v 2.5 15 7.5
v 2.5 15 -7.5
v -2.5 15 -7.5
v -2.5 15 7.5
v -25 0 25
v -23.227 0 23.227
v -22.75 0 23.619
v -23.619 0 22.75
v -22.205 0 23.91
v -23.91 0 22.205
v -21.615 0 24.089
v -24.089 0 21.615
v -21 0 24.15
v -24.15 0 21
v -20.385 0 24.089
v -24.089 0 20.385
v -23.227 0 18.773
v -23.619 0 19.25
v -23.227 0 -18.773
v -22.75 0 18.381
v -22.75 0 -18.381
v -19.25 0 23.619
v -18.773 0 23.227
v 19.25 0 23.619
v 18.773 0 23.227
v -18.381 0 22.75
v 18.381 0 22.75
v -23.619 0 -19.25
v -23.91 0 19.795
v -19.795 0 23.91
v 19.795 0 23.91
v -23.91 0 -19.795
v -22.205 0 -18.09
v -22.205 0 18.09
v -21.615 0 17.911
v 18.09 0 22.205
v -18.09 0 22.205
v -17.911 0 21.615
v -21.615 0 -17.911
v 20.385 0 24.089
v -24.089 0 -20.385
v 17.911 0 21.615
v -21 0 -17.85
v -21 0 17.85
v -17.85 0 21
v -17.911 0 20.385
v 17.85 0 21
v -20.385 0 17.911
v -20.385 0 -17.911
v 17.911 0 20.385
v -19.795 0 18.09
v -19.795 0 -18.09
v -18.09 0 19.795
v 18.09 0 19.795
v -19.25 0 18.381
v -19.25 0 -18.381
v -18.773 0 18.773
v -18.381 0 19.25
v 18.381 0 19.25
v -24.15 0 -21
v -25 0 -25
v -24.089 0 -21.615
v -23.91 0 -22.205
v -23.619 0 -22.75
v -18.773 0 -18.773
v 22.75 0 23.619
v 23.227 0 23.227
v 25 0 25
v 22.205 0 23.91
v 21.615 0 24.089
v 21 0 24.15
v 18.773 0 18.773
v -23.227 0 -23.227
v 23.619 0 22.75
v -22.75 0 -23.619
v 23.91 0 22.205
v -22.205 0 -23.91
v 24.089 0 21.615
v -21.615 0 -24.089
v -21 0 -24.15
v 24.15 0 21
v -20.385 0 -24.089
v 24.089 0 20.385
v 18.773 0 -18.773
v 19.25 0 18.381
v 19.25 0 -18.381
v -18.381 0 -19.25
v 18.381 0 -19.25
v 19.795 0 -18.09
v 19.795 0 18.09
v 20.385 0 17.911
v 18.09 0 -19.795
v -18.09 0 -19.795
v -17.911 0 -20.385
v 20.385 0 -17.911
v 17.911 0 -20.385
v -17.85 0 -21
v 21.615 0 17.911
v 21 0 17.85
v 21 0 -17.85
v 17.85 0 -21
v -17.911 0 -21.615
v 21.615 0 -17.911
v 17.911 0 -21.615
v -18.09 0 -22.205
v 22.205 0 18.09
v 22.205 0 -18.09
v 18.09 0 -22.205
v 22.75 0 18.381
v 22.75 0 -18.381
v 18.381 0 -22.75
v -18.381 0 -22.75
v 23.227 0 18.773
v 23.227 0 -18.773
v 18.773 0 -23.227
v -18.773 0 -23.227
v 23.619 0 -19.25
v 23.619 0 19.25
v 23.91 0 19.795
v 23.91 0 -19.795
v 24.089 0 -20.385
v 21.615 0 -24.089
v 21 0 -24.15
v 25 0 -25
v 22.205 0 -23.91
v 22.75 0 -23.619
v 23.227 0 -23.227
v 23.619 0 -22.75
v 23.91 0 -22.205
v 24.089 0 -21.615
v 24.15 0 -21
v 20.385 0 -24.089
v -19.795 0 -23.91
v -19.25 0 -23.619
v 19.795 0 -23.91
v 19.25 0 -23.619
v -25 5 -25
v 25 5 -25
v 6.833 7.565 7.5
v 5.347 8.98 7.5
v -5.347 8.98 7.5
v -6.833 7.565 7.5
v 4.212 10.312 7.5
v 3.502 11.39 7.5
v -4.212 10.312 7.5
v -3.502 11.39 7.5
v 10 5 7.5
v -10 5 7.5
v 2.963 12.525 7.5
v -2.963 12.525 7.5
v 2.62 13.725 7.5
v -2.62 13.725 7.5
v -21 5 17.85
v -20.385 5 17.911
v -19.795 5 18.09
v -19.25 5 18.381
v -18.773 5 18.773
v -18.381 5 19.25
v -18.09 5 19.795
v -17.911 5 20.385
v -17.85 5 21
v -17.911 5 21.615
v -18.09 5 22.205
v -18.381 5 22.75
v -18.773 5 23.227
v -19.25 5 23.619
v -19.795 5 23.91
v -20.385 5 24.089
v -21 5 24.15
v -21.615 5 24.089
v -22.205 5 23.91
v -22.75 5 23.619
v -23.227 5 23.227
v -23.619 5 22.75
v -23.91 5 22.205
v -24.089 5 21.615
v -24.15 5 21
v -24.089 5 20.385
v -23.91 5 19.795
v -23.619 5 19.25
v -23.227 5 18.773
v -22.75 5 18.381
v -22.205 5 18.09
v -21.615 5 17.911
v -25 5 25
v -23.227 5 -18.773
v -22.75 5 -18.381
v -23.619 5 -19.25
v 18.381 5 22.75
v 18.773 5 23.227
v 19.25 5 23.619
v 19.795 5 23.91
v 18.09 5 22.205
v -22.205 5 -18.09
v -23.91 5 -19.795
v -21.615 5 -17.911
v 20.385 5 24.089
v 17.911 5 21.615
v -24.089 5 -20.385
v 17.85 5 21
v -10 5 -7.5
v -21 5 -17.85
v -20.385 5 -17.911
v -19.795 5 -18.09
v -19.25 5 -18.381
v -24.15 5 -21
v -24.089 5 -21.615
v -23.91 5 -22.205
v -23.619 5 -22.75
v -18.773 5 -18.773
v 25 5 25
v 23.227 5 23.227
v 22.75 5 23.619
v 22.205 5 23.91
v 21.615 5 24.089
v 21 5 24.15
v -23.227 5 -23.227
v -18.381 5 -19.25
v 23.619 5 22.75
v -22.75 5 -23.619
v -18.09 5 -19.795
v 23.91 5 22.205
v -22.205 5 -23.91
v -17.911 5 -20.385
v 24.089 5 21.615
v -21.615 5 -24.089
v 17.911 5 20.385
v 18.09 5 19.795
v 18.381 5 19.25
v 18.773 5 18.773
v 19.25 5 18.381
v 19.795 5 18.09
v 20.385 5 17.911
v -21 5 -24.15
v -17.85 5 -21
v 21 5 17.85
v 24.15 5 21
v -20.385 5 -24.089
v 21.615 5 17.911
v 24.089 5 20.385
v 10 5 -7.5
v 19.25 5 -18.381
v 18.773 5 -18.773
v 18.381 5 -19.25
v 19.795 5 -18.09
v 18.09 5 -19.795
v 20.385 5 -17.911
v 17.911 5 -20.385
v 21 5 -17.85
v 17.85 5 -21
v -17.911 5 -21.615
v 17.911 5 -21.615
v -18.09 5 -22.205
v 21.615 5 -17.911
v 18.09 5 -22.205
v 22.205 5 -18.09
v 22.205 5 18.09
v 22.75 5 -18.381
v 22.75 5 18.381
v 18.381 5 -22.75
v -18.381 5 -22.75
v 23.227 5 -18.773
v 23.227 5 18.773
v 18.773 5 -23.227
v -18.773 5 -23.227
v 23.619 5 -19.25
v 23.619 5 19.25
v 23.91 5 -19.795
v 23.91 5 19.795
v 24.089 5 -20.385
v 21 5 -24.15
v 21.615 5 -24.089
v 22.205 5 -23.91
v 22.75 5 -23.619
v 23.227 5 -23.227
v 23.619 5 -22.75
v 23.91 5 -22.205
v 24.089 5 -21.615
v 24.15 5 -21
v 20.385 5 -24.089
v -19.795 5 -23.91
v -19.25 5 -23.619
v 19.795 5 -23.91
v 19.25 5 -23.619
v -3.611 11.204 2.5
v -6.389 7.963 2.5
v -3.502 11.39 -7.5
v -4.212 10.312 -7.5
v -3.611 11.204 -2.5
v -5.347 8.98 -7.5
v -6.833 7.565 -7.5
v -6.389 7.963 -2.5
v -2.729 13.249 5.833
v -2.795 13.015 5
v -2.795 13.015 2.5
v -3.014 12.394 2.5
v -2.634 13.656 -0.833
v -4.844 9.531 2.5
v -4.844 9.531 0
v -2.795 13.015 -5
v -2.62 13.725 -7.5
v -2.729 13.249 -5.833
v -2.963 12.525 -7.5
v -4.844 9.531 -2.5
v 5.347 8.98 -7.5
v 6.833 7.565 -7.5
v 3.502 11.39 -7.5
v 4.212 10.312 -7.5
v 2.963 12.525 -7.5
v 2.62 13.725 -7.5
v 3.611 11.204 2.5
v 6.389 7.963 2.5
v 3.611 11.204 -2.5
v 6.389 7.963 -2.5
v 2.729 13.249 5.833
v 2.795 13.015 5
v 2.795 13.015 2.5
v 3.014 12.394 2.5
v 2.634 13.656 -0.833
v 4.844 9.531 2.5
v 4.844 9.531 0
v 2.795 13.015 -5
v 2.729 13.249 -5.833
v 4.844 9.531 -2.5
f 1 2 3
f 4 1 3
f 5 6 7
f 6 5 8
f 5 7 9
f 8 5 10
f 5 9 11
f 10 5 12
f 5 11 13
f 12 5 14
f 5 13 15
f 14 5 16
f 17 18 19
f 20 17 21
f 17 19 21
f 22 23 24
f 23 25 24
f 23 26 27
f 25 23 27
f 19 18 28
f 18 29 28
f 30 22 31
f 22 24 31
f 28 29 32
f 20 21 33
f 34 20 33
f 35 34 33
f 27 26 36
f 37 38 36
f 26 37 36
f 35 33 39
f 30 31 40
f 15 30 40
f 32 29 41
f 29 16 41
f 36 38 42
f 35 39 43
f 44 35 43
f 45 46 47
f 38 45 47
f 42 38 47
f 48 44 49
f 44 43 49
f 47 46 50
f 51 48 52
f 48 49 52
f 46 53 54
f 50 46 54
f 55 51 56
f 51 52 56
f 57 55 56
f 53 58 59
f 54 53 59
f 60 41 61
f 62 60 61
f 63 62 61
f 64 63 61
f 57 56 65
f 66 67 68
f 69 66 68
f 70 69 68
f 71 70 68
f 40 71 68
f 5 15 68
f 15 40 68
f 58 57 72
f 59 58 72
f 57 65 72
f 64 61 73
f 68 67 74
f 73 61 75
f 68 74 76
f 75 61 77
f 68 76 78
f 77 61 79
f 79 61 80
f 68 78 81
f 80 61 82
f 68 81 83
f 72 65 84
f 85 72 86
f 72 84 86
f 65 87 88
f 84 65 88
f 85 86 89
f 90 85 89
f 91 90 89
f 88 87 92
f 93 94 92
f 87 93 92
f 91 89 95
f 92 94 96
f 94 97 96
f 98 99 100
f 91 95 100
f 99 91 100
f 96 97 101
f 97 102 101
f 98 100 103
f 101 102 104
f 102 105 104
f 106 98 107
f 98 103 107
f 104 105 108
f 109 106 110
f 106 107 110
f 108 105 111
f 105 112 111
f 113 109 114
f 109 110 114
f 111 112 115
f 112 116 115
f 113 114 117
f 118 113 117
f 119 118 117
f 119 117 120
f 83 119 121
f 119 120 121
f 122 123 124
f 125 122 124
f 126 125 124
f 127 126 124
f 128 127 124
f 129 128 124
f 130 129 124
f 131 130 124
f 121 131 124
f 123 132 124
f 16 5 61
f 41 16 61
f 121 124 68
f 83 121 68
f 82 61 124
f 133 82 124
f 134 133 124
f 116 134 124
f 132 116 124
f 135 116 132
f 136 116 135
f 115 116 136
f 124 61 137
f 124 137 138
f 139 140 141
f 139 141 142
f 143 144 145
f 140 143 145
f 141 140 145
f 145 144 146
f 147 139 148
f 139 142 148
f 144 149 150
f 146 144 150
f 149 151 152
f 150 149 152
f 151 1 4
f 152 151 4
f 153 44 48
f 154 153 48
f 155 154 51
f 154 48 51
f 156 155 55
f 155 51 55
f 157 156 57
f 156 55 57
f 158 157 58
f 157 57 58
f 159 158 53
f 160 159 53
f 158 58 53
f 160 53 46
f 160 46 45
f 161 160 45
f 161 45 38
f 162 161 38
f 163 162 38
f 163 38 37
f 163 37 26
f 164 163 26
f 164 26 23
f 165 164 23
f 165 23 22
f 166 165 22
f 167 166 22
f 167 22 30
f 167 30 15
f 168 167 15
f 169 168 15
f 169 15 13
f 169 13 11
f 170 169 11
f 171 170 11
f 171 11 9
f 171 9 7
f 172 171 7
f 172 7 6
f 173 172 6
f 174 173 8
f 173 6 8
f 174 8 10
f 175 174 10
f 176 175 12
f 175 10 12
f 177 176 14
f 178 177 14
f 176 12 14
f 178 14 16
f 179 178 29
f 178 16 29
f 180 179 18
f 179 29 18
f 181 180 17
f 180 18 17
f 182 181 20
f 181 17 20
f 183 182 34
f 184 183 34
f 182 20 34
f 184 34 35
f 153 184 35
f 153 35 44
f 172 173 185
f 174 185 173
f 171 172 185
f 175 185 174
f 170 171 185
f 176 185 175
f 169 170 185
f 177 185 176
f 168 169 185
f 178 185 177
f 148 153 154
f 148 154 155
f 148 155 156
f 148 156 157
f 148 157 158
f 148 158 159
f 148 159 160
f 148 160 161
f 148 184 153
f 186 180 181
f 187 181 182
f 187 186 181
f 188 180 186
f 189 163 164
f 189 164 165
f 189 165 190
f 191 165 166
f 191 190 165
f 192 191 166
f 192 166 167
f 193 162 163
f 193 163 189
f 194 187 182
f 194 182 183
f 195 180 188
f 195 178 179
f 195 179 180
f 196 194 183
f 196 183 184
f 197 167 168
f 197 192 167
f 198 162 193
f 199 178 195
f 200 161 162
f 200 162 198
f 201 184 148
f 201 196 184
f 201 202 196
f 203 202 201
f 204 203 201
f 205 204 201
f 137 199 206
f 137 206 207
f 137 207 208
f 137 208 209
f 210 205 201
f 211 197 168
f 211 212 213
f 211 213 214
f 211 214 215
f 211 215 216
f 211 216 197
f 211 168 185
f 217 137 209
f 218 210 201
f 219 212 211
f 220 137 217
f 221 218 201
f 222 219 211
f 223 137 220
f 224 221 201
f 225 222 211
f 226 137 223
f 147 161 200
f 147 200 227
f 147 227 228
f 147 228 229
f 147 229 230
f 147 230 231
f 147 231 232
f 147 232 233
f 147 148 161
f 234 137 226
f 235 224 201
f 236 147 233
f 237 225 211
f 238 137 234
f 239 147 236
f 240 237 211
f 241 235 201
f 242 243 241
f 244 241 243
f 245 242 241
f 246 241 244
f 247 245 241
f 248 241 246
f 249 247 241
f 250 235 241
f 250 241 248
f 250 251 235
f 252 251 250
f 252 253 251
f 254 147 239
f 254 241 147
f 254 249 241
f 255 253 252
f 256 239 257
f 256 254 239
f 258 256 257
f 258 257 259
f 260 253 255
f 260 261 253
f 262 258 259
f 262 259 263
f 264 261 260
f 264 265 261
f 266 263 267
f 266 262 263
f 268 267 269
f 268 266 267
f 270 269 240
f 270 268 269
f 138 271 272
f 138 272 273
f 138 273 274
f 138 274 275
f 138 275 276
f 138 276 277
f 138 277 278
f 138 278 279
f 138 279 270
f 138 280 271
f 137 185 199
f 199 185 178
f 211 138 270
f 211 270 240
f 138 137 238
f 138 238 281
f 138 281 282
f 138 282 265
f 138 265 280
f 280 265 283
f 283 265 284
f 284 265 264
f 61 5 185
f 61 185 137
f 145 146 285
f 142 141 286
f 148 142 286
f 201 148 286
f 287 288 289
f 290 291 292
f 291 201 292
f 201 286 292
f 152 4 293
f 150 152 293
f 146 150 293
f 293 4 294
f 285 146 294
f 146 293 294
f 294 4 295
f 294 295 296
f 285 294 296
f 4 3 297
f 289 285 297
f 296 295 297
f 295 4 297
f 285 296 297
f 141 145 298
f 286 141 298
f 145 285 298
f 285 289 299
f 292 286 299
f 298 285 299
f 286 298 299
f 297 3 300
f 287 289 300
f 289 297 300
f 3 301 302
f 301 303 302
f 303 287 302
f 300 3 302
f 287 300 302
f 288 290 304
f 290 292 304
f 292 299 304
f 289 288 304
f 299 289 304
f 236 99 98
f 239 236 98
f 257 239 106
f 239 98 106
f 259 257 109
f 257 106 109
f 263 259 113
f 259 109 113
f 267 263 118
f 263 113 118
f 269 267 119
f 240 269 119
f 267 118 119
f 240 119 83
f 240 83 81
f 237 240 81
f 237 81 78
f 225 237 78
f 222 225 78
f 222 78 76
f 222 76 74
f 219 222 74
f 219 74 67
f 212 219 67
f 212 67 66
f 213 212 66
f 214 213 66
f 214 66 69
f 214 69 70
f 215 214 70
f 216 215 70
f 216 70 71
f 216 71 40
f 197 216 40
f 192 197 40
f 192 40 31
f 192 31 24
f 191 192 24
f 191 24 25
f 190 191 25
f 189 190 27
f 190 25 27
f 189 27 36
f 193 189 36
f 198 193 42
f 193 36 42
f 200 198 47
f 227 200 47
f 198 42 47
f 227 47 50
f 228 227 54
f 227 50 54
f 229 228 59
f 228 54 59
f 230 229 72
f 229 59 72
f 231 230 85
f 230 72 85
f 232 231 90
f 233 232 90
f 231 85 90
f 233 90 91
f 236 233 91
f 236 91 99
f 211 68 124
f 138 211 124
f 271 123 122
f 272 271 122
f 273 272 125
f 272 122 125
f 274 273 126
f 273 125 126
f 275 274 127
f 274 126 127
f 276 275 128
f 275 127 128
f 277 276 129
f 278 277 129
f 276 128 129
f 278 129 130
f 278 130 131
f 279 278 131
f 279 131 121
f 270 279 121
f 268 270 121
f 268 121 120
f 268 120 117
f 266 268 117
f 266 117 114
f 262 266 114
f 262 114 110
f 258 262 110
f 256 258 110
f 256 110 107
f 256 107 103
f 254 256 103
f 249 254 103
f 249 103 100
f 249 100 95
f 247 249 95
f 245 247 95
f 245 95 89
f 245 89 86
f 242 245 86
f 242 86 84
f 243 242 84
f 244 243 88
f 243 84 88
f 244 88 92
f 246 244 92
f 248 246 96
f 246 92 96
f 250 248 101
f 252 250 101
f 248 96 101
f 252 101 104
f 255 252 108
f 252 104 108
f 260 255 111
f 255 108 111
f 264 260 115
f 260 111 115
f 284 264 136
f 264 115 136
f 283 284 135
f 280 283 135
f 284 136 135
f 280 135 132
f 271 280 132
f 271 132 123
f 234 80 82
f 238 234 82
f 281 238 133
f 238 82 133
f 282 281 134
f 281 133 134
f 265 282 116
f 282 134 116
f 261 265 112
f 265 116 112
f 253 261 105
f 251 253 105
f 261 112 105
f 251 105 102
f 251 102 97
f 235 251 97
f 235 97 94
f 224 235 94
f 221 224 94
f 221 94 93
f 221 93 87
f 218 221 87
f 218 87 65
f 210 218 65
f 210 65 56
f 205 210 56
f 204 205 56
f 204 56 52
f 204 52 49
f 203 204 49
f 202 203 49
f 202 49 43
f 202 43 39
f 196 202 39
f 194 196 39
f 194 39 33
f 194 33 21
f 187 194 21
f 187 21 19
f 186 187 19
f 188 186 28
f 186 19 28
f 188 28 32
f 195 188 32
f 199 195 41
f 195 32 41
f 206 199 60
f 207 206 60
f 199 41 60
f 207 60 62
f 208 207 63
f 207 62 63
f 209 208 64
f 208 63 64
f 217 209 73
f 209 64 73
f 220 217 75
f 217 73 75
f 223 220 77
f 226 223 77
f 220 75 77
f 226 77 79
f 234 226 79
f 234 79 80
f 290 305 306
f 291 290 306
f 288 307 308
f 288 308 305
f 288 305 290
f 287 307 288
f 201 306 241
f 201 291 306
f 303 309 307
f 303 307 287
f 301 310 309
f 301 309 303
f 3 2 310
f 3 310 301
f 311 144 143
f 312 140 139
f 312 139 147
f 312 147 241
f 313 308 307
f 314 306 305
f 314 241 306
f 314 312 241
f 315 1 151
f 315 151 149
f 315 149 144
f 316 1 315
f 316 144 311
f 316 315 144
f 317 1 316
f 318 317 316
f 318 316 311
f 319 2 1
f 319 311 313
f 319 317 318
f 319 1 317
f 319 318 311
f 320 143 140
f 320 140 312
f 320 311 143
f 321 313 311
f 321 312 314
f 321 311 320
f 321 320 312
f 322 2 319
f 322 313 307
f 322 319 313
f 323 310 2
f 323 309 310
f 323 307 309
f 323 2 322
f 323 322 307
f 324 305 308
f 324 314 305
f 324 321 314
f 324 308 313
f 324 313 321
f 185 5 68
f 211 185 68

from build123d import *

# Parameters (mm, degrees)
SKETCH1_W           = 50
SKETCH1_H           = 50
BOSS_EXTRUDE1_DEPTH = 5
LOFT1_START         = -7.5
LOFT1_DEPTH         = 15
SKETCH7_R           = 3.15
CUT_EXTRUDE1_DEPTH  = 39.405728778


# Read off the part's stored shape, not the designer's step: Loft1
with BuildPart() as part:
    # Sketch1 → Boss-Extrude1 (new body)
    with BuildSketch(Plane(origin=(0, 0, 0), x_dir=(1, 0, 0), z_dir=(0, 1, 0))):
        Rectangle(SKETCH1_W, SKETCH1_H)
    extrude(amount=BOSS_EXTRUDE1_DEPTH)

    # Loft1 outline → Loft1 (add)
    with BuildSketch(Plane.XY.offset(LOFT1_START)):
        with BuildLine():
            add(Edge.make_bspline(
                [(2.5, 15), (2.5, 10.833333333), (6.25, 7.916666667), (10, 5)],
                knots=[0, 0, 0, 0, 1, 1, 1, 1], degree=3))
            Line((2.5, 15), (-2.5, 15))
            add(Edge.make_bspline(
                [(-2.5, 15), (-2.5, 10.833333333), (-6.25, 7.916666667), (-10, 5)],
                knots=[0, 0, 0, 0, 1, 1, 1, 1], degree=3))
            Line((-10, 5), (10, 5))
        make_face()
    extrude(amount=LOFT1_DEPTH)

    # Sketch7 → Cut-Extrude1 (cut, through all)
    with BuildSketch(Plane(origin=(0, 0, 0), x_dir=(-1, 0, 0), z_dir=(0, -1, 0))):
        with Locations(Location((21, -21, 0), (0, 0, 90))):
            Circle(SKETCH7_R)
        with Locations(Location((-21, -21, 0), (0, 0, 90))):
            Circle(SKETCH7_R)
        with Locations(Location((-21, 21, 0), (0, 0, 90))):
            Circle(SKETCH7_R)
        with Locations(Location((21, 21, 0), (0, 0, 90))):
            Circle(SKETCH7_R)
    extrude(amount=-CUT_EXTRUDE1_DEPTH, mode=Mode.SUBTRACT)


solid = part.part
